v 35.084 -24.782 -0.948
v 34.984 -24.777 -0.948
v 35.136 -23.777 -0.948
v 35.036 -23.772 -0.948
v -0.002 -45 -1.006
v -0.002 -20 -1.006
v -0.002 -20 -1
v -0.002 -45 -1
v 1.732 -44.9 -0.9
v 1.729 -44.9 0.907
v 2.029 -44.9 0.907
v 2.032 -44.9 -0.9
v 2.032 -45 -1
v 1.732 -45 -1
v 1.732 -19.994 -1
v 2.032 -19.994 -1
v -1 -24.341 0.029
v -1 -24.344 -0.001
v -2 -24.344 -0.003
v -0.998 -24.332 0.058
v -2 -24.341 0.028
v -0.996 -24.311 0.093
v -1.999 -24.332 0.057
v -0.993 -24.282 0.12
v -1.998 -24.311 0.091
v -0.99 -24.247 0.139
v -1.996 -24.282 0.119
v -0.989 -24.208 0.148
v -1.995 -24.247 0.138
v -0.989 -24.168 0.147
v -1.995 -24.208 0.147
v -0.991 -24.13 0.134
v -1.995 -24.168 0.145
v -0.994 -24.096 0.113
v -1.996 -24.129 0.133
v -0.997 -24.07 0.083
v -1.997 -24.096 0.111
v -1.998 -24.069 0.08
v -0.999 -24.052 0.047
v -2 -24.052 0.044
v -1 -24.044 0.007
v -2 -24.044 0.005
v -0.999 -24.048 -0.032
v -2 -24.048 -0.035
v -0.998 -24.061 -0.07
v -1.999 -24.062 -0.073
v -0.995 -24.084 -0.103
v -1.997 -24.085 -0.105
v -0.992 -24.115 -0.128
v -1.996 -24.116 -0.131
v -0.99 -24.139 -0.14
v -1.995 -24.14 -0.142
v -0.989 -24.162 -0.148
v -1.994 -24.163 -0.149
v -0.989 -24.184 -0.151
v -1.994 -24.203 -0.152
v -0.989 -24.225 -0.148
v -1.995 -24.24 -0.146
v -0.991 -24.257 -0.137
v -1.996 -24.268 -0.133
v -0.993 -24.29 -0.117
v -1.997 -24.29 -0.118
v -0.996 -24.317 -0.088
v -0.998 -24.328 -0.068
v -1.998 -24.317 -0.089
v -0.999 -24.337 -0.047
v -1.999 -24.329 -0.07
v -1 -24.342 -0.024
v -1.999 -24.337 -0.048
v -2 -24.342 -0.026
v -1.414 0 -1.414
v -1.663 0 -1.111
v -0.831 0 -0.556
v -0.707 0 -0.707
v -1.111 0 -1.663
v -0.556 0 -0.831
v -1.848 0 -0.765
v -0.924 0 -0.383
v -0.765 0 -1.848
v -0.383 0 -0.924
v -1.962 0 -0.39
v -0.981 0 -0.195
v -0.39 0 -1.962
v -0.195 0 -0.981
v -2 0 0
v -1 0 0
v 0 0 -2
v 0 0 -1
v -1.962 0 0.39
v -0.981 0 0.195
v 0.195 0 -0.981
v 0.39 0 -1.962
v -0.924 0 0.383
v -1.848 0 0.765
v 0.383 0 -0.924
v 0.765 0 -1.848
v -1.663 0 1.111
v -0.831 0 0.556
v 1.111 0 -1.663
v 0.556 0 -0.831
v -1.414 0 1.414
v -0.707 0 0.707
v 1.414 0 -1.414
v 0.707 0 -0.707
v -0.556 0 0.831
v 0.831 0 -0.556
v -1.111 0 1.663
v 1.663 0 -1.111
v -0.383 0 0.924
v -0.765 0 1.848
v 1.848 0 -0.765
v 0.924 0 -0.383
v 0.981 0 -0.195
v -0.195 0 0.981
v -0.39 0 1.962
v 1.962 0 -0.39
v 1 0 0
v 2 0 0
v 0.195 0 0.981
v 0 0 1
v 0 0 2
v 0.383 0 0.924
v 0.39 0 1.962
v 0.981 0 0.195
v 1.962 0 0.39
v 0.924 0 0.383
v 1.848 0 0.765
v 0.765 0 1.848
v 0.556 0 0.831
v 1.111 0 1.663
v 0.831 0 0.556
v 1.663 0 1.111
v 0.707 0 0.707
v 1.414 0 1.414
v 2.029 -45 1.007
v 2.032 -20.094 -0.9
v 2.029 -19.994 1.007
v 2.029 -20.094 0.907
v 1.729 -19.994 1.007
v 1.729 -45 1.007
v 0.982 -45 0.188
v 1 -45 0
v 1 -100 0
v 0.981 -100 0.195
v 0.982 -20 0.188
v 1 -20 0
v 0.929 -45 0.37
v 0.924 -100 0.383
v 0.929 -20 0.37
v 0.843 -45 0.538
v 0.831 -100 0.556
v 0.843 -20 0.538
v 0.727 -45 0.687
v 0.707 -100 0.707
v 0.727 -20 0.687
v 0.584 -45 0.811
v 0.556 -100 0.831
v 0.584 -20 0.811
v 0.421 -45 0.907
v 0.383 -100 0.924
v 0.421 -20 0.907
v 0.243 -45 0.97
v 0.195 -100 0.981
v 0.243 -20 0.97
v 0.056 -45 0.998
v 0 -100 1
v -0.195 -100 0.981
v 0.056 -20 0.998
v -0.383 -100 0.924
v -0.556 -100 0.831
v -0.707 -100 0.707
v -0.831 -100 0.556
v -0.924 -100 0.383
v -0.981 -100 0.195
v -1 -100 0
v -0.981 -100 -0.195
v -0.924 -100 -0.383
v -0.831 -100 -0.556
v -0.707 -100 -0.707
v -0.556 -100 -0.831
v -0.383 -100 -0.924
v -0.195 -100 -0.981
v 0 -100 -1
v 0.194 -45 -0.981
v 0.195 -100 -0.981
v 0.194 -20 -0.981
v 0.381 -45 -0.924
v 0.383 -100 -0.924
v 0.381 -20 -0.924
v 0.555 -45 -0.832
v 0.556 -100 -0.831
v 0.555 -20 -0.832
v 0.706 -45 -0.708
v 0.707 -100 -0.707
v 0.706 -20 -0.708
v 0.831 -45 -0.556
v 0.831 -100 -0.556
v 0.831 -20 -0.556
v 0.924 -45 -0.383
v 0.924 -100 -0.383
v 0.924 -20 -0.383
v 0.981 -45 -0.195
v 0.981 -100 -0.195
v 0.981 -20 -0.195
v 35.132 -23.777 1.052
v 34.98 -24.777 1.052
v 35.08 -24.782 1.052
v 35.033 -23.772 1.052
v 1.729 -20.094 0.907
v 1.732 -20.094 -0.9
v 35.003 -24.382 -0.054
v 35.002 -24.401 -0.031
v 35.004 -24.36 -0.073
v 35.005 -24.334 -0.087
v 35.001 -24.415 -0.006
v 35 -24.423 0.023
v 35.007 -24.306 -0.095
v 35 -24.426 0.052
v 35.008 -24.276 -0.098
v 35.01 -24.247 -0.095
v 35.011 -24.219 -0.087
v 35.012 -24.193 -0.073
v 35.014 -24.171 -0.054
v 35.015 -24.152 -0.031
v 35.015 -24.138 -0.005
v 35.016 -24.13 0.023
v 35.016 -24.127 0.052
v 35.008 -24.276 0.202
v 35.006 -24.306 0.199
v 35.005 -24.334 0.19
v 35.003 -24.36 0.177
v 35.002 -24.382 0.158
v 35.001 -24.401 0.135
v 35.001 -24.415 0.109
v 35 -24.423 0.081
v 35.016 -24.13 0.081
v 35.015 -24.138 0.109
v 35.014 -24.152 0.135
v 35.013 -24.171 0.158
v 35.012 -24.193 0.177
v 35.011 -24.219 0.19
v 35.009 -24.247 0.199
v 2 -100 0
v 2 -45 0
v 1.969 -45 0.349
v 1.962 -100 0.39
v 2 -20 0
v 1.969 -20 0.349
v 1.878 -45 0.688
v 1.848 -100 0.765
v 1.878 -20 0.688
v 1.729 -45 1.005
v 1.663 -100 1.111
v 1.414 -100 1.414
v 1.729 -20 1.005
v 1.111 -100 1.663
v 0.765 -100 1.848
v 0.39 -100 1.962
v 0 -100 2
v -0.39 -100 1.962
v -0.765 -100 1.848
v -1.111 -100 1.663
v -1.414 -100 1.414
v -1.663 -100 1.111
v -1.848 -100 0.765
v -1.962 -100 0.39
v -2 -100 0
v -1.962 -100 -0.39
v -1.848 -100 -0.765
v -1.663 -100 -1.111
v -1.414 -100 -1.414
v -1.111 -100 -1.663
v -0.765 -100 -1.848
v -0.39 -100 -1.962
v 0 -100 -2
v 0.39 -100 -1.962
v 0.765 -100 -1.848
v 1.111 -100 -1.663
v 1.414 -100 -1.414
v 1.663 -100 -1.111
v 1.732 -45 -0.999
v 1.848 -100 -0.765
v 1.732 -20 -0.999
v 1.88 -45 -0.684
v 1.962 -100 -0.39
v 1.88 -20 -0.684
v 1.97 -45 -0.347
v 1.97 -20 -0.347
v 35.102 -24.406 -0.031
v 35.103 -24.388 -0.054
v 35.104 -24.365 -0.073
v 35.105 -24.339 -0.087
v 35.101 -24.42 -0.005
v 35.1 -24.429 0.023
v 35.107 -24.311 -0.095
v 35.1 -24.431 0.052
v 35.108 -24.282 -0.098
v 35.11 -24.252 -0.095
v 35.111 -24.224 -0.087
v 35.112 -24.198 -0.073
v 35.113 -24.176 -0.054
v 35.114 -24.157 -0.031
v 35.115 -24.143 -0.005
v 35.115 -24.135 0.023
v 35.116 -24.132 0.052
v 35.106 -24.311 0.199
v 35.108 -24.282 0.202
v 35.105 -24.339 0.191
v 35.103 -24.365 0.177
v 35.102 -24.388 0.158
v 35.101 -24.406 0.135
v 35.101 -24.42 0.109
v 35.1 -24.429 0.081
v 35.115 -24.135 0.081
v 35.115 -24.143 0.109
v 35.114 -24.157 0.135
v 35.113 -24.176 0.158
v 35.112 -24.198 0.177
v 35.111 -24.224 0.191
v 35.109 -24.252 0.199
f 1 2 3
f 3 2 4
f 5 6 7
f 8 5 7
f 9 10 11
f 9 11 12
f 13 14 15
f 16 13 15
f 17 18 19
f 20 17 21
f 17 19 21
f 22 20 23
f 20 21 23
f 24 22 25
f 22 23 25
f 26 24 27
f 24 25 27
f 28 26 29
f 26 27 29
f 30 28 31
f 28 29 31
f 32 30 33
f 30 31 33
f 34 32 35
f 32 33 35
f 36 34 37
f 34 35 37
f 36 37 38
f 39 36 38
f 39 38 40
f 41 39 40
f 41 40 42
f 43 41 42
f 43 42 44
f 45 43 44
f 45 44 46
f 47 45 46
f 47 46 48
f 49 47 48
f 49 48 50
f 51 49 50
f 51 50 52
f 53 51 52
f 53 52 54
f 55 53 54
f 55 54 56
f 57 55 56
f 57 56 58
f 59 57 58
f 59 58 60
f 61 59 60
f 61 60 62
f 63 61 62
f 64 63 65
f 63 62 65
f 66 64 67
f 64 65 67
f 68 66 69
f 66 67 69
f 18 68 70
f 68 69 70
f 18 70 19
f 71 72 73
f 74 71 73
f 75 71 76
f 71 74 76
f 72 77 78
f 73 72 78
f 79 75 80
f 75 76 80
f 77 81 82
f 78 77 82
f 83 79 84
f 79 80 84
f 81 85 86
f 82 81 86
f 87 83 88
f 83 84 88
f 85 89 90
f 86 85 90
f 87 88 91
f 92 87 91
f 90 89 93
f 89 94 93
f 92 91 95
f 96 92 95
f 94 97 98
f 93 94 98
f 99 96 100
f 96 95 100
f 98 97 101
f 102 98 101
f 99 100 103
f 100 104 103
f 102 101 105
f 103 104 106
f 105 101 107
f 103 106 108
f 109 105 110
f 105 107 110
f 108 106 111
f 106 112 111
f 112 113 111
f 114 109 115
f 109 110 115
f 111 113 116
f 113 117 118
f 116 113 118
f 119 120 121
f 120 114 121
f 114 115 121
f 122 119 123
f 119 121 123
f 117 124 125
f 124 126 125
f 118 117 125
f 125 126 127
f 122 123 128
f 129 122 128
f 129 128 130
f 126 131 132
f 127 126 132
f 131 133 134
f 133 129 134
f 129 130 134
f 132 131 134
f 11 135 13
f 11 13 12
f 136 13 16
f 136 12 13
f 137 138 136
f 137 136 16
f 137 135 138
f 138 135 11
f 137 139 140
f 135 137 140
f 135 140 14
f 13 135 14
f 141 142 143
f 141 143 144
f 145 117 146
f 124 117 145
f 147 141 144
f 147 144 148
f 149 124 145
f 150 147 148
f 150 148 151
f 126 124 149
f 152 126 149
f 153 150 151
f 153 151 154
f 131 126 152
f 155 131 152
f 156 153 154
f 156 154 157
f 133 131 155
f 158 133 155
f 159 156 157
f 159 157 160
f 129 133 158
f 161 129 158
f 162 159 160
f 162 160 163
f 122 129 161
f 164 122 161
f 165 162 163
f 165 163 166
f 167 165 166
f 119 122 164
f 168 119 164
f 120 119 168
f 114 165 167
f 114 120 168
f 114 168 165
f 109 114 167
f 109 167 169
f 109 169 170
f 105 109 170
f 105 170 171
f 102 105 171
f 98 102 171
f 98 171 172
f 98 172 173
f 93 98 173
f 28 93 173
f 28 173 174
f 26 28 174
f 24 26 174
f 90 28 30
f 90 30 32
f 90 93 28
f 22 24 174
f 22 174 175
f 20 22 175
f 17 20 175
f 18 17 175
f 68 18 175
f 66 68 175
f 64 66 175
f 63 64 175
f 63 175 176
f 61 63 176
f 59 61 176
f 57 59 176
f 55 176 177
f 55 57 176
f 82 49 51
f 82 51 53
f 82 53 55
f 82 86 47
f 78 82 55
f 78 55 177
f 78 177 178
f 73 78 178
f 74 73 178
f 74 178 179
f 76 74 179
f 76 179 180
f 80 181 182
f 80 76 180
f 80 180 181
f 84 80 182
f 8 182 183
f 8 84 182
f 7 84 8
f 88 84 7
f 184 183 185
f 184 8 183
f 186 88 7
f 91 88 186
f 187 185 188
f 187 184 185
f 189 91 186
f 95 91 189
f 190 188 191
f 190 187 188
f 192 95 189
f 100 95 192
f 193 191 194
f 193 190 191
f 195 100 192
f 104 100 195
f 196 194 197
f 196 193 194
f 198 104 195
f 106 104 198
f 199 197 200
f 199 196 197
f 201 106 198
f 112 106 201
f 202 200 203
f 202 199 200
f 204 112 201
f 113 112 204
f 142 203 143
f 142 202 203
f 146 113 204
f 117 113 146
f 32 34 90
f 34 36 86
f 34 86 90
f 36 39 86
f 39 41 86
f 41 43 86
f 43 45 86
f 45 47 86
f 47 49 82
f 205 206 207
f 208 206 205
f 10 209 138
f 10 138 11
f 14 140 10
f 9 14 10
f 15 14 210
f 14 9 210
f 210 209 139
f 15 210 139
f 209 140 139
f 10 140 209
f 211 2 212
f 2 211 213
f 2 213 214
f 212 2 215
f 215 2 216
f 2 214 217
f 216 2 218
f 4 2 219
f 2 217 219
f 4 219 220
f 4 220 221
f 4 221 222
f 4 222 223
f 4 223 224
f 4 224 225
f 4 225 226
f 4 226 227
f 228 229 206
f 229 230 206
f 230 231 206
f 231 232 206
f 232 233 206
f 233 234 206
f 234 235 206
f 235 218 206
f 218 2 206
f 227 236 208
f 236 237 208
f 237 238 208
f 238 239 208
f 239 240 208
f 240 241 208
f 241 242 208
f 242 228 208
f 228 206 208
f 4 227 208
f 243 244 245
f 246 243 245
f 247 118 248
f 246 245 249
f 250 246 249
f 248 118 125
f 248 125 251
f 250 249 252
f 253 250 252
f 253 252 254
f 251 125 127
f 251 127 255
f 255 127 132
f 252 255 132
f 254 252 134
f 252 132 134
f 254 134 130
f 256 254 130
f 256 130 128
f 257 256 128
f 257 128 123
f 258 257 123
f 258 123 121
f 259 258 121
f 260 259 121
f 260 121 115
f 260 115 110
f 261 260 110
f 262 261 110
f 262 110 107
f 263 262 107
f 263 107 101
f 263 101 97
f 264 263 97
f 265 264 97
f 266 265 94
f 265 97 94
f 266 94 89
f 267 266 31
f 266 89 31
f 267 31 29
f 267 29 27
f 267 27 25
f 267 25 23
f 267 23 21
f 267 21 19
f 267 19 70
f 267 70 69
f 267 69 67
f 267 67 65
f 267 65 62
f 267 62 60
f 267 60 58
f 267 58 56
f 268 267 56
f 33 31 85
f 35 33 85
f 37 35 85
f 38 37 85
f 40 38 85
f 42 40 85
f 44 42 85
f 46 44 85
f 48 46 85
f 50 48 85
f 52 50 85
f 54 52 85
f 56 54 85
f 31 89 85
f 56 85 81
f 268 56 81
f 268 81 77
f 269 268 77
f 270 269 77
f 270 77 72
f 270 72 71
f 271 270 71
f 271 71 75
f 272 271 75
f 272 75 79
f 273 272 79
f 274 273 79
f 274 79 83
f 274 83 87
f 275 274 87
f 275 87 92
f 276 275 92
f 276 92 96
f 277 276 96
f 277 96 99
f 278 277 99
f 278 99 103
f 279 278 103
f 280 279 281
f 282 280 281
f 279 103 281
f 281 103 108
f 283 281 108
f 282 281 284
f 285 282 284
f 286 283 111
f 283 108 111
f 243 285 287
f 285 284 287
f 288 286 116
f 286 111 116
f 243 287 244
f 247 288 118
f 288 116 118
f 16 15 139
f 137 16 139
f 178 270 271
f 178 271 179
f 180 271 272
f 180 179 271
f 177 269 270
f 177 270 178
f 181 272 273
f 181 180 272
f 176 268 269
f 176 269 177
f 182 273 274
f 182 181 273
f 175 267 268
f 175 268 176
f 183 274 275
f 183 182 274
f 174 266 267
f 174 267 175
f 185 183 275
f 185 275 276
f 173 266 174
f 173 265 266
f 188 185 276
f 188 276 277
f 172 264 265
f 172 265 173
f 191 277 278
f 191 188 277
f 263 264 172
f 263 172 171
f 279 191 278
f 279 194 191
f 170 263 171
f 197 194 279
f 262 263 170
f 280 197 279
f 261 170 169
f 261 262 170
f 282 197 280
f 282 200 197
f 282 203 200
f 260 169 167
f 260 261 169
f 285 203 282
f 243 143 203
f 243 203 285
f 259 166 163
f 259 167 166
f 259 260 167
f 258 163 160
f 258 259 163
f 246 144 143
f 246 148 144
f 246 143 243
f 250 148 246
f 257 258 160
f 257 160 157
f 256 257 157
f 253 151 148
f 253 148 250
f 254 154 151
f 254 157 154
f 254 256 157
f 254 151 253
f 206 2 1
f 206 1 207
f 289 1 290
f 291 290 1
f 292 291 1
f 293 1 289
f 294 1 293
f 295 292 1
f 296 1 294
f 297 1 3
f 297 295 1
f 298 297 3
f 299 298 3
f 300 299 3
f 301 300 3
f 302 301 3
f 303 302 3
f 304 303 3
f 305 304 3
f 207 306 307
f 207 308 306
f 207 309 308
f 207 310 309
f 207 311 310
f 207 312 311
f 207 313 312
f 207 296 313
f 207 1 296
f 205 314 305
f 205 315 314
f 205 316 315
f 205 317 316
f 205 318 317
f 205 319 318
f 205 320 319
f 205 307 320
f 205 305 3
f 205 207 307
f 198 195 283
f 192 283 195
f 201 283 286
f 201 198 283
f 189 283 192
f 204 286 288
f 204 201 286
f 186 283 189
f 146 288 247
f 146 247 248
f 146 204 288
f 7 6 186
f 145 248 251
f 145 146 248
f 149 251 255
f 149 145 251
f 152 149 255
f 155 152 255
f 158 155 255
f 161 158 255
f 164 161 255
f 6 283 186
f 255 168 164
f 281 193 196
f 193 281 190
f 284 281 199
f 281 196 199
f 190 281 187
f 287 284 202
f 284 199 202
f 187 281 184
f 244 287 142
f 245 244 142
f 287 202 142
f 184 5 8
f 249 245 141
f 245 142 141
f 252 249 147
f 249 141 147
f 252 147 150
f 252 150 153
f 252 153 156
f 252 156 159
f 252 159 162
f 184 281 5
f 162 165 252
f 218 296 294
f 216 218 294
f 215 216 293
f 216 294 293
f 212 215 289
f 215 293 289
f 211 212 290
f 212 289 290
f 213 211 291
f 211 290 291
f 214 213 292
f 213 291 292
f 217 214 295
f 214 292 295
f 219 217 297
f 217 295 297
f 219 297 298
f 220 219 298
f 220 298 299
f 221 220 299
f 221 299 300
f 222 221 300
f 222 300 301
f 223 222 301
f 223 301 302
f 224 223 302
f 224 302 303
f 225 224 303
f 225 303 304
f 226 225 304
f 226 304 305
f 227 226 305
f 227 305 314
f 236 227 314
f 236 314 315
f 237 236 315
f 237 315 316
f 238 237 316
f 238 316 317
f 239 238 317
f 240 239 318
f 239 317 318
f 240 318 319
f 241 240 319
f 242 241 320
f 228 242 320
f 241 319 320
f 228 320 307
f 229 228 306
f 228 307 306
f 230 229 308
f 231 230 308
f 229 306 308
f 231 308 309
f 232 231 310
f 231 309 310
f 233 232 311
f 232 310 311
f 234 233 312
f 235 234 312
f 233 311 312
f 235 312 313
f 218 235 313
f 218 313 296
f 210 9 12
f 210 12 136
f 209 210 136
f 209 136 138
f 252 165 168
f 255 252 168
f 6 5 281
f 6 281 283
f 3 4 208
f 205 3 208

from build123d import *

# Parameters (mm, degrees)
F0_R          = 2
F0_R_2        = 1
F1_DEPTH      = 100
F5_E5_W       = 2.0043330533
F5_E5_H       = 25
F6_DEPTH      = 25
F6_DEPTH_BACK = 1
F9_DEPTH      = 0.3
F10_T         = -0.1
F14_W         = 1.0064751207
F14_H         = 2
F15_DEPTH     = 0.1
F16_D         = 0.3
F17_D         = 0.3


# Not quite as in the source:
# - a feature of the source that left no trace in its solid (it failed there, or was rolled back) is left out


with BuildPart() as f1:
    # F0 (on Front) → F1 (new body)
    with BuildSketch(Plane.XZ):
        Circle(F0_R)
        Circle(F0_R_2, mode=Mode.SUBTRACT)
    extrude(amount=F1_DEPTH)

    # F5_E5 (on explicit) → F6 (cut, two sides)
    with BuildSketch(Plane(origin=(0.9982800111, -45, -1.0022865608), x_dir=(-0.0038684819, 0, 0.9999925174), z_dir=(-0.9999925174, 0, -0.0038684819))) as f6_sk:
        with Locations((1.0021665267, 12.5)):
            Rectangle(F5_E5_W, F5_E5_H)
    extrude(amount=-F6_DEPTH, mode=Mode.SUBTRACT)
    extrude(f6_sk.sketch, amount=F6_DEPTH_BACK, mode=Mode.SUBTRACT)

    # F17 (through all)
    with Locations(Plane(origin=(1.7307944858, 0, 0.0027212049), x_dir=(0, 1, 0), z_dir=(0.9999987641, 0, 0.0015722268))):
        with Locations((-24.1942365289, 0.0004732283)):
            Hole(F17_D / 2)


with BuildPart() as f9:
    # F8 (on face) → F9 (new body)
    with BuildSketch(Plane(origin=(1.7307944858, 0, 0.0027212049), x_dir=(0, 1, 0), z_dir=(0.9999987641, 0, 0.0015722268))):
        Polygon((-45.0004413724, -1.0031352285), (-19.9942365289, -1.0031352285), (-19.9942365289, 0.0004732283), (-24.1942365289, 0.0004732283), (-41.1659032106, 0.0004732283), (-45.0004413724, 0.0004732283), align=None)
        Polygon((-24.1942365289, 0.0004732283), (-19.9942365289, 0.0004732283), (-19.9942365289, 1.0040816851), (-45.0004413724, 1.0040816851), (-45.0004413724, 0.0004732283), (-41.1659032106, 0.0004732283), align=None)
    extrude(amount=F9_DEPTH)

    # F10
    f10_openings = [f9.faces().sort_by_distance(p)[0] for p in [
        (2.030793, -32.497339, 0.003666),
        (1.730794, -32.497339, 0.003194),
    ]]
    offset(amount=F10_T, openings=f10_openings)


with BuildPart() as f15:
    # F14 (on face) → F15 (new body)
    with BuildSketch(Plane(origin=(36.1674841996, -1.8718308958, 0.056863559), x_dir=(0.0516852214, 0.9986634224, 8.1261e-05), z_dir=(0.9986621881, -0.0516852853, 0.0015701254))):
        with Locations((-22.4322800759, -0.0031352285)):
            Rectangle(F14_W, F14_H)
        Polygon((-22.8325207636, -0.9031352285), (-22.8325207636, 0.8968647715), (-22.4346363536, 0.8968647715), (-22.0367519436, 0.8968647715), (-22.0367519436, -0.9031352285), (-22.4346363536, -0.9031352285), align=None, mode=Mode.SUBTRACT)
        Polygon((-22.4346363536, 0.8968647715), (-22.8325207636, 0.8968647715), (-22.8325207636, -0.9031352285), (-22.4346363536, -0.9031352285), (-22.4346363536, -0.0031352285), align=None)
        Polygon((-22.0367519436, 0.8968647715), (-22.4346363536, 0.8968647715), (-22.4346363536, -0.0031352285), (-22.4346363536, -0.9031352285), (-22.0367519436, -0.9031352285), align=None)
    extrude(amount=F15_DEPTH)

    # F16 (through all)
    with Locations(Plane(origin=(36.1674841996, -1.8718308958, 0.056863559), x_dir=(0.0516852214, 0.9986634224, 8.1261e-05), z_dir=(-0.9986621881, 0.0516852853, -0.0015701254))):
        with Locations((-22.4346363536, 0.0031352285)):
            Hole(F16_D / 2)


solid = Compound([f1.part, f9.part, f15.part])
